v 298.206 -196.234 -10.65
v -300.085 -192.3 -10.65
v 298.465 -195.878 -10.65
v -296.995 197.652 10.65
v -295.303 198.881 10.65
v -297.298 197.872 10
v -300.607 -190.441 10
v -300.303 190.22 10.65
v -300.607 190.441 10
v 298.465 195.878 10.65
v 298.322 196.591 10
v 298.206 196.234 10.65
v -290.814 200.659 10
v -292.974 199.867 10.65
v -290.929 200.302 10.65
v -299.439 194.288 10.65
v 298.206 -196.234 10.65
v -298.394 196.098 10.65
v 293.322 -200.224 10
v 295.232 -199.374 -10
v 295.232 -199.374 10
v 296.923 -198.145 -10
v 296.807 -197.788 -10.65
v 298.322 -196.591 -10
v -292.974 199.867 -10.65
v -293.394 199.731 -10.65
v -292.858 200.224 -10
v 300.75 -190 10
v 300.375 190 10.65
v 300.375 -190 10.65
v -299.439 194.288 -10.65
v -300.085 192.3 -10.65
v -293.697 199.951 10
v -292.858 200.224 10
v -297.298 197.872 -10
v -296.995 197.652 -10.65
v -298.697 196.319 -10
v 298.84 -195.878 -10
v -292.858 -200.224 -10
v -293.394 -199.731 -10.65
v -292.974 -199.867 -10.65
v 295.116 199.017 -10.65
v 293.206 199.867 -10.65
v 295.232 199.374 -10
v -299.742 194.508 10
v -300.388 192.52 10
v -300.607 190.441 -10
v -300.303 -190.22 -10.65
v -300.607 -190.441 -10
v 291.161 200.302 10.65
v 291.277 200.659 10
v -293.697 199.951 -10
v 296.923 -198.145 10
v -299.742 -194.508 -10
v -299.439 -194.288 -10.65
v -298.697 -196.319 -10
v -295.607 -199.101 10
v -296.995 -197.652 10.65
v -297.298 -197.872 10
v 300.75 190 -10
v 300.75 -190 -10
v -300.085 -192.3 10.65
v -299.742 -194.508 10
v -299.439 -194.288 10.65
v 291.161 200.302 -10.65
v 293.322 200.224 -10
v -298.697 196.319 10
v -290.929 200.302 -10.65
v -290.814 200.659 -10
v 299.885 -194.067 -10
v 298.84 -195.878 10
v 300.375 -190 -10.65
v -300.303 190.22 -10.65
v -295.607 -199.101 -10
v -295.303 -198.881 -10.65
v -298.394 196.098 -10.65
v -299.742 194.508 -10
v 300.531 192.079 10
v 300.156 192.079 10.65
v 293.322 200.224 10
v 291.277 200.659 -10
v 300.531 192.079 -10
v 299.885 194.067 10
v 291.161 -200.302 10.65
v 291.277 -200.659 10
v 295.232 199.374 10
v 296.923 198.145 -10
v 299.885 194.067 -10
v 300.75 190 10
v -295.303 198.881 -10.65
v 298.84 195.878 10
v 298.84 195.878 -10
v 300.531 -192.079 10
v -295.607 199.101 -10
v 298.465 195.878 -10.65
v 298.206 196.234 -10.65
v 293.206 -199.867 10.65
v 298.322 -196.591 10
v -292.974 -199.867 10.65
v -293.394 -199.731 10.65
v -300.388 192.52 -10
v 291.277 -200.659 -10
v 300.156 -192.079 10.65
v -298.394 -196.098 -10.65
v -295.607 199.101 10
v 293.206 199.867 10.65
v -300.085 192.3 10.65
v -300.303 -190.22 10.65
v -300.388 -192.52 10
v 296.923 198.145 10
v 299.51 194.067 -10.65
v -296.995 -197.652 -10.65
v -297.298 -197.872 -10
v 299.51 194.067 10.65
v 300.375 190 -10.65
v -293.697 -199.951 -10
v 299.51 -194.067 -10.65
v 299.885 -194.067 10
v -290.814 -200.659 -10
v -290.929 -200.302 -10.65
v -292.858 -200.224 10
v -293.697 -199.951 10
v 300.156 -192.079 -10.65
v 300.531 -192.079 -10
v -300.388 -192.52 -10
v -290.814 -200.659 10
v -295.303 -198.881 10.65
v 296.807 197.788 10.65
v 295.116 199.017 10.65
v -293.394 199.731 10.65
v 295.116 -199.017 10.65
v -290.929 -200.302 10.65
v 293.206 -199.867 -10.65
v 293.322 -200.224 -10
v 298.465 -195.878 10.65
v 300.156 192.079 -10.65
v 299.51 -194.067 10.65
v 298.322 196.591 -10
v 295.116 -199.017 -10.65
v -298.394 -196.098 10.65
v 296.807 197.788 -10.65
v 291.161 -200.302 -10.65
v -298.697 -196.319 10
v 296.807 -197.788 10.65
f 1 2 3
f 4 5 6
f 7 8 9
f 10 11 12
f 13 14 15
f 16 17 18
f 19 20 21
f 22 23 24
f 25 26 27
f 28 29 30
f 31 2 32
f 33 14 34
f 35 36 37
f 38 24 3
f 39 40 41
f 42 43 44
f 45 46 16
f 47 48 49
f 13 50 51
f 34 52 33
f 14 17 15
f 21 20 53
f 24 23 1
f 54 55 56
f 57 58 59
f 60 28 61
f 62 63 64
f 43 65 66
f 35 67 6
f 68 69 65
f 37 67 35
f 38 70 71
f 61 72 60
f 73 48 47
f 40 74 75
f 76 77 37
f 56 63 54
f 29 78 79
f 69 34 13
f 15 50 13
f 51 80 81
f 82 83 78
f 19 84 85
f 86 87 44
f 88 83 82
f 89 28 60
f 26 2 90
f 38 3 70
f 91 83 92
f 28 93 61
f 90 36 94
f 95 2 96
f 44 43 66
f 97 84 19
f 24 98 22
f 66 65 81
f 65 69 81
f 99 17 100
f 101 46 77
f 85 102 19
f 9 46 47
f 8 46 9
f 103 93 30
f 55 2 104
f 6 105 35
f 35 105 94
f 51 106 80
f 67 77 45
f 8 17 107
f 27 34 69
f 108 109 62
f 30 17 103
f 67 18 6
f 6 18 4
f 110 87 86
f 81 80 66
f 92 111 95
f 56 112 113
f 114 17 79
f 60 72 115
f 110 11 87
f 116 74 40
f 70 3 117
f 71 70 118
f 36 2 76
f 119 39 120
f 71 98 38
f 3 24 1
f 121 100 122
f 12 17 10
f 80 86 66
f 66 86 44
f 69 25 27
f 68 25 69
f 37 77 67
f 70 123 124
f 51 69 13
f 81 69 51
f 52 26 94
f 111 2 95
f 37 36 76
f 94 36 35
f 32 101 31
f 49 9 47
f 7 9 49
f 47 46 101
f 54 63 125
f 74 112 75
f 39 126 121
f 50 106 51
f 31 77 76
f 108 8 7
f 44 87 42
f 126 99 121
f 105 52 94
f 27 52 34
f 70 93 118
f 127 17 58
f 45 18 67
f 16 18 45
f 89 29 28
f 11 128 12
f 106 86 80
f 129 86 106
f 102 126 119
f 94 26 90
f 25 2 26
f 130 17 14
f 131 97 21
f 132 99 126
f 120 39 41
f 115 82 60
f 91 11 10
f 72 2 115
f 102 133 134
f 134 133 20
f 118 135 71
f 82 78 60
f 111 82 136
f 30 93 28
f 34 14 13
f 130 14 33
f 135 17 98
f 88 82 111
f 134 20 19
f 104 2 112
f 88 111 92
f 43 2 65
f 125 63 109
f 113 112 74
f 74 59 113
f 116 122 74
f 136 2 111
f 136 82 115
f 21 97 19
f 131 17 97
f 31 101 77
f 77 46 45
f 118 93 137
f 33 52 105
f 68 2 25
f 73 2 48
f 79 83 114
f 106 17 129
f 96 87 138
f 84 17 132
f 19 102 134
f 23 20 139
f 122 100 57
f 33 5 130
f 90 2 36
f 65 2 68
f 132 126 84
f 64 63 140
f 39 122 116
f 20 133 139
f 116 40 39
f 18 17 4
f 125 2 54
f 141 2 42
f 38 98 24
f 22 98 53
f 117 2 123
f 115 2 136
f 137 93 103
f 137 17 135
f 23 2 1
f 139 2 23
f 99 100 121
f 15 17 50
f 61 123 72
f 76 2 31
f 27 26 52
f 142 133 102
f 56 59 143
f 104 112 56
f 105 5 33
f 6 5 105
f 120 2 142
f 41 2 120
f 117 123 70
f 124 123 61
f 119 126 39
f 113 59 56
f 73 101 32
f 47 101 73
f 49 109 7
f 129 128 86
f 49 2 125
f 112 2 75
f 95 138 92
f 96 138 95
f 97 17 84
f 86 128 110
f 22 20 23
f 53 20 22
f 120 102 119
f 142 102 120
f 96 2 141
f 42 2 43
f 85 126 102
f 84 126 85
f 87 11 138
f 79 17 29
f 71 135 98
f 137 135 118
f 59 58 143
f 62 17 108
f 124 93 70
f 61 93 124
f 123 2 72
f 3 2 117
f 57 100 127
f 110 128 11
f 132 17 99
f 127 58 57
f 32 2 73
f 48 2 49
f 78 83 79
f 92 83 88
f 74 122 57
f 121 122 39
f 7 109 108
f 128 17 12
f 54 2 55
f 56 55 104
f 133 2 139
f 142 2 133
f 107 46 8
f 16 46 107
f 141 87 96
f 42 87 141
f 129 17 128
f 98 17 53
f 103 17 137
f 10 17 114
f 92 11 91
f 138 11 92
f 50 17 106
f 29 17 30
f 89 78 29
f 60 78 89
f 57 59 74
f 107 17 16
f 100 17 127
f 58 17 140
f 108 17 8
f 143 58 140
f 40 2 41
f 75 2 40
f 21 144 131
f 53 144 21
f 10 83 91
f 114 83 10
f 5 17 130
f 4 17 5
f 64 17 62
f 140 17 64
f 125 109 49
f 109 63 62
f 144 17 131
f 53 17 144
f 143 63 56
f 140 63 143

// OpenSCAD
// Parameters
sheet_length = 600; //[300:1200:1]
sheet_width = 400; //[200:800:1]
sheet_thickness = 18; //[9:36:1]
corner_radius = 10; //[2:30:1]
edge_chamfer = 1.5; //[0.5:4:0.5]
minkowski_sphere_radius = 0.75; //[0.25:2:0.25]

// Base shapes
module mdf_sheet() {
  cube([sheet_length, sheet_width, sheet_thickness], center=true);
}

module corner_cylinder() {
  cylinder(r=corner_radius, h=sheet_thickness + 2, center=true);
}

module edge_chamfer_sphere() {
  sphere(r=minkowski_sphere_radius, center=true);
}

// Operations
module rounded_corners_sheet() {
  hull() {
    translate([-sheet_length/2 + corner_radius, sheet_width/2 - corner_radius, 0]) corner_cylinder();
    translate([sheet_length/2 - corner_radius, sheet_width/2 - corner_radius, 0]) corner_cylinder();
    translate([-sheet_length/2 + corner_radius, -sheet_width/2 + corner_radius, 0]) corner_cylinder();
    translate([sheet_length/2 - corner_radius, -sheet_width/2 + corner_radius, 0]) corner_cylinder();
  }
}

module sheet_with_edge_chamfer() {
  minkowski() {
    rounded_corners_sheet();
    edge_chamfer_sphere();
  }
}

// Final model
module final_model() {
  union() {
    sheet_with_edge_chamfer();
    // Label text is not included as per rules
  }
}

// Render the final model
color([0.85, 0.85, 0.8]) // MDF color
final_model();
